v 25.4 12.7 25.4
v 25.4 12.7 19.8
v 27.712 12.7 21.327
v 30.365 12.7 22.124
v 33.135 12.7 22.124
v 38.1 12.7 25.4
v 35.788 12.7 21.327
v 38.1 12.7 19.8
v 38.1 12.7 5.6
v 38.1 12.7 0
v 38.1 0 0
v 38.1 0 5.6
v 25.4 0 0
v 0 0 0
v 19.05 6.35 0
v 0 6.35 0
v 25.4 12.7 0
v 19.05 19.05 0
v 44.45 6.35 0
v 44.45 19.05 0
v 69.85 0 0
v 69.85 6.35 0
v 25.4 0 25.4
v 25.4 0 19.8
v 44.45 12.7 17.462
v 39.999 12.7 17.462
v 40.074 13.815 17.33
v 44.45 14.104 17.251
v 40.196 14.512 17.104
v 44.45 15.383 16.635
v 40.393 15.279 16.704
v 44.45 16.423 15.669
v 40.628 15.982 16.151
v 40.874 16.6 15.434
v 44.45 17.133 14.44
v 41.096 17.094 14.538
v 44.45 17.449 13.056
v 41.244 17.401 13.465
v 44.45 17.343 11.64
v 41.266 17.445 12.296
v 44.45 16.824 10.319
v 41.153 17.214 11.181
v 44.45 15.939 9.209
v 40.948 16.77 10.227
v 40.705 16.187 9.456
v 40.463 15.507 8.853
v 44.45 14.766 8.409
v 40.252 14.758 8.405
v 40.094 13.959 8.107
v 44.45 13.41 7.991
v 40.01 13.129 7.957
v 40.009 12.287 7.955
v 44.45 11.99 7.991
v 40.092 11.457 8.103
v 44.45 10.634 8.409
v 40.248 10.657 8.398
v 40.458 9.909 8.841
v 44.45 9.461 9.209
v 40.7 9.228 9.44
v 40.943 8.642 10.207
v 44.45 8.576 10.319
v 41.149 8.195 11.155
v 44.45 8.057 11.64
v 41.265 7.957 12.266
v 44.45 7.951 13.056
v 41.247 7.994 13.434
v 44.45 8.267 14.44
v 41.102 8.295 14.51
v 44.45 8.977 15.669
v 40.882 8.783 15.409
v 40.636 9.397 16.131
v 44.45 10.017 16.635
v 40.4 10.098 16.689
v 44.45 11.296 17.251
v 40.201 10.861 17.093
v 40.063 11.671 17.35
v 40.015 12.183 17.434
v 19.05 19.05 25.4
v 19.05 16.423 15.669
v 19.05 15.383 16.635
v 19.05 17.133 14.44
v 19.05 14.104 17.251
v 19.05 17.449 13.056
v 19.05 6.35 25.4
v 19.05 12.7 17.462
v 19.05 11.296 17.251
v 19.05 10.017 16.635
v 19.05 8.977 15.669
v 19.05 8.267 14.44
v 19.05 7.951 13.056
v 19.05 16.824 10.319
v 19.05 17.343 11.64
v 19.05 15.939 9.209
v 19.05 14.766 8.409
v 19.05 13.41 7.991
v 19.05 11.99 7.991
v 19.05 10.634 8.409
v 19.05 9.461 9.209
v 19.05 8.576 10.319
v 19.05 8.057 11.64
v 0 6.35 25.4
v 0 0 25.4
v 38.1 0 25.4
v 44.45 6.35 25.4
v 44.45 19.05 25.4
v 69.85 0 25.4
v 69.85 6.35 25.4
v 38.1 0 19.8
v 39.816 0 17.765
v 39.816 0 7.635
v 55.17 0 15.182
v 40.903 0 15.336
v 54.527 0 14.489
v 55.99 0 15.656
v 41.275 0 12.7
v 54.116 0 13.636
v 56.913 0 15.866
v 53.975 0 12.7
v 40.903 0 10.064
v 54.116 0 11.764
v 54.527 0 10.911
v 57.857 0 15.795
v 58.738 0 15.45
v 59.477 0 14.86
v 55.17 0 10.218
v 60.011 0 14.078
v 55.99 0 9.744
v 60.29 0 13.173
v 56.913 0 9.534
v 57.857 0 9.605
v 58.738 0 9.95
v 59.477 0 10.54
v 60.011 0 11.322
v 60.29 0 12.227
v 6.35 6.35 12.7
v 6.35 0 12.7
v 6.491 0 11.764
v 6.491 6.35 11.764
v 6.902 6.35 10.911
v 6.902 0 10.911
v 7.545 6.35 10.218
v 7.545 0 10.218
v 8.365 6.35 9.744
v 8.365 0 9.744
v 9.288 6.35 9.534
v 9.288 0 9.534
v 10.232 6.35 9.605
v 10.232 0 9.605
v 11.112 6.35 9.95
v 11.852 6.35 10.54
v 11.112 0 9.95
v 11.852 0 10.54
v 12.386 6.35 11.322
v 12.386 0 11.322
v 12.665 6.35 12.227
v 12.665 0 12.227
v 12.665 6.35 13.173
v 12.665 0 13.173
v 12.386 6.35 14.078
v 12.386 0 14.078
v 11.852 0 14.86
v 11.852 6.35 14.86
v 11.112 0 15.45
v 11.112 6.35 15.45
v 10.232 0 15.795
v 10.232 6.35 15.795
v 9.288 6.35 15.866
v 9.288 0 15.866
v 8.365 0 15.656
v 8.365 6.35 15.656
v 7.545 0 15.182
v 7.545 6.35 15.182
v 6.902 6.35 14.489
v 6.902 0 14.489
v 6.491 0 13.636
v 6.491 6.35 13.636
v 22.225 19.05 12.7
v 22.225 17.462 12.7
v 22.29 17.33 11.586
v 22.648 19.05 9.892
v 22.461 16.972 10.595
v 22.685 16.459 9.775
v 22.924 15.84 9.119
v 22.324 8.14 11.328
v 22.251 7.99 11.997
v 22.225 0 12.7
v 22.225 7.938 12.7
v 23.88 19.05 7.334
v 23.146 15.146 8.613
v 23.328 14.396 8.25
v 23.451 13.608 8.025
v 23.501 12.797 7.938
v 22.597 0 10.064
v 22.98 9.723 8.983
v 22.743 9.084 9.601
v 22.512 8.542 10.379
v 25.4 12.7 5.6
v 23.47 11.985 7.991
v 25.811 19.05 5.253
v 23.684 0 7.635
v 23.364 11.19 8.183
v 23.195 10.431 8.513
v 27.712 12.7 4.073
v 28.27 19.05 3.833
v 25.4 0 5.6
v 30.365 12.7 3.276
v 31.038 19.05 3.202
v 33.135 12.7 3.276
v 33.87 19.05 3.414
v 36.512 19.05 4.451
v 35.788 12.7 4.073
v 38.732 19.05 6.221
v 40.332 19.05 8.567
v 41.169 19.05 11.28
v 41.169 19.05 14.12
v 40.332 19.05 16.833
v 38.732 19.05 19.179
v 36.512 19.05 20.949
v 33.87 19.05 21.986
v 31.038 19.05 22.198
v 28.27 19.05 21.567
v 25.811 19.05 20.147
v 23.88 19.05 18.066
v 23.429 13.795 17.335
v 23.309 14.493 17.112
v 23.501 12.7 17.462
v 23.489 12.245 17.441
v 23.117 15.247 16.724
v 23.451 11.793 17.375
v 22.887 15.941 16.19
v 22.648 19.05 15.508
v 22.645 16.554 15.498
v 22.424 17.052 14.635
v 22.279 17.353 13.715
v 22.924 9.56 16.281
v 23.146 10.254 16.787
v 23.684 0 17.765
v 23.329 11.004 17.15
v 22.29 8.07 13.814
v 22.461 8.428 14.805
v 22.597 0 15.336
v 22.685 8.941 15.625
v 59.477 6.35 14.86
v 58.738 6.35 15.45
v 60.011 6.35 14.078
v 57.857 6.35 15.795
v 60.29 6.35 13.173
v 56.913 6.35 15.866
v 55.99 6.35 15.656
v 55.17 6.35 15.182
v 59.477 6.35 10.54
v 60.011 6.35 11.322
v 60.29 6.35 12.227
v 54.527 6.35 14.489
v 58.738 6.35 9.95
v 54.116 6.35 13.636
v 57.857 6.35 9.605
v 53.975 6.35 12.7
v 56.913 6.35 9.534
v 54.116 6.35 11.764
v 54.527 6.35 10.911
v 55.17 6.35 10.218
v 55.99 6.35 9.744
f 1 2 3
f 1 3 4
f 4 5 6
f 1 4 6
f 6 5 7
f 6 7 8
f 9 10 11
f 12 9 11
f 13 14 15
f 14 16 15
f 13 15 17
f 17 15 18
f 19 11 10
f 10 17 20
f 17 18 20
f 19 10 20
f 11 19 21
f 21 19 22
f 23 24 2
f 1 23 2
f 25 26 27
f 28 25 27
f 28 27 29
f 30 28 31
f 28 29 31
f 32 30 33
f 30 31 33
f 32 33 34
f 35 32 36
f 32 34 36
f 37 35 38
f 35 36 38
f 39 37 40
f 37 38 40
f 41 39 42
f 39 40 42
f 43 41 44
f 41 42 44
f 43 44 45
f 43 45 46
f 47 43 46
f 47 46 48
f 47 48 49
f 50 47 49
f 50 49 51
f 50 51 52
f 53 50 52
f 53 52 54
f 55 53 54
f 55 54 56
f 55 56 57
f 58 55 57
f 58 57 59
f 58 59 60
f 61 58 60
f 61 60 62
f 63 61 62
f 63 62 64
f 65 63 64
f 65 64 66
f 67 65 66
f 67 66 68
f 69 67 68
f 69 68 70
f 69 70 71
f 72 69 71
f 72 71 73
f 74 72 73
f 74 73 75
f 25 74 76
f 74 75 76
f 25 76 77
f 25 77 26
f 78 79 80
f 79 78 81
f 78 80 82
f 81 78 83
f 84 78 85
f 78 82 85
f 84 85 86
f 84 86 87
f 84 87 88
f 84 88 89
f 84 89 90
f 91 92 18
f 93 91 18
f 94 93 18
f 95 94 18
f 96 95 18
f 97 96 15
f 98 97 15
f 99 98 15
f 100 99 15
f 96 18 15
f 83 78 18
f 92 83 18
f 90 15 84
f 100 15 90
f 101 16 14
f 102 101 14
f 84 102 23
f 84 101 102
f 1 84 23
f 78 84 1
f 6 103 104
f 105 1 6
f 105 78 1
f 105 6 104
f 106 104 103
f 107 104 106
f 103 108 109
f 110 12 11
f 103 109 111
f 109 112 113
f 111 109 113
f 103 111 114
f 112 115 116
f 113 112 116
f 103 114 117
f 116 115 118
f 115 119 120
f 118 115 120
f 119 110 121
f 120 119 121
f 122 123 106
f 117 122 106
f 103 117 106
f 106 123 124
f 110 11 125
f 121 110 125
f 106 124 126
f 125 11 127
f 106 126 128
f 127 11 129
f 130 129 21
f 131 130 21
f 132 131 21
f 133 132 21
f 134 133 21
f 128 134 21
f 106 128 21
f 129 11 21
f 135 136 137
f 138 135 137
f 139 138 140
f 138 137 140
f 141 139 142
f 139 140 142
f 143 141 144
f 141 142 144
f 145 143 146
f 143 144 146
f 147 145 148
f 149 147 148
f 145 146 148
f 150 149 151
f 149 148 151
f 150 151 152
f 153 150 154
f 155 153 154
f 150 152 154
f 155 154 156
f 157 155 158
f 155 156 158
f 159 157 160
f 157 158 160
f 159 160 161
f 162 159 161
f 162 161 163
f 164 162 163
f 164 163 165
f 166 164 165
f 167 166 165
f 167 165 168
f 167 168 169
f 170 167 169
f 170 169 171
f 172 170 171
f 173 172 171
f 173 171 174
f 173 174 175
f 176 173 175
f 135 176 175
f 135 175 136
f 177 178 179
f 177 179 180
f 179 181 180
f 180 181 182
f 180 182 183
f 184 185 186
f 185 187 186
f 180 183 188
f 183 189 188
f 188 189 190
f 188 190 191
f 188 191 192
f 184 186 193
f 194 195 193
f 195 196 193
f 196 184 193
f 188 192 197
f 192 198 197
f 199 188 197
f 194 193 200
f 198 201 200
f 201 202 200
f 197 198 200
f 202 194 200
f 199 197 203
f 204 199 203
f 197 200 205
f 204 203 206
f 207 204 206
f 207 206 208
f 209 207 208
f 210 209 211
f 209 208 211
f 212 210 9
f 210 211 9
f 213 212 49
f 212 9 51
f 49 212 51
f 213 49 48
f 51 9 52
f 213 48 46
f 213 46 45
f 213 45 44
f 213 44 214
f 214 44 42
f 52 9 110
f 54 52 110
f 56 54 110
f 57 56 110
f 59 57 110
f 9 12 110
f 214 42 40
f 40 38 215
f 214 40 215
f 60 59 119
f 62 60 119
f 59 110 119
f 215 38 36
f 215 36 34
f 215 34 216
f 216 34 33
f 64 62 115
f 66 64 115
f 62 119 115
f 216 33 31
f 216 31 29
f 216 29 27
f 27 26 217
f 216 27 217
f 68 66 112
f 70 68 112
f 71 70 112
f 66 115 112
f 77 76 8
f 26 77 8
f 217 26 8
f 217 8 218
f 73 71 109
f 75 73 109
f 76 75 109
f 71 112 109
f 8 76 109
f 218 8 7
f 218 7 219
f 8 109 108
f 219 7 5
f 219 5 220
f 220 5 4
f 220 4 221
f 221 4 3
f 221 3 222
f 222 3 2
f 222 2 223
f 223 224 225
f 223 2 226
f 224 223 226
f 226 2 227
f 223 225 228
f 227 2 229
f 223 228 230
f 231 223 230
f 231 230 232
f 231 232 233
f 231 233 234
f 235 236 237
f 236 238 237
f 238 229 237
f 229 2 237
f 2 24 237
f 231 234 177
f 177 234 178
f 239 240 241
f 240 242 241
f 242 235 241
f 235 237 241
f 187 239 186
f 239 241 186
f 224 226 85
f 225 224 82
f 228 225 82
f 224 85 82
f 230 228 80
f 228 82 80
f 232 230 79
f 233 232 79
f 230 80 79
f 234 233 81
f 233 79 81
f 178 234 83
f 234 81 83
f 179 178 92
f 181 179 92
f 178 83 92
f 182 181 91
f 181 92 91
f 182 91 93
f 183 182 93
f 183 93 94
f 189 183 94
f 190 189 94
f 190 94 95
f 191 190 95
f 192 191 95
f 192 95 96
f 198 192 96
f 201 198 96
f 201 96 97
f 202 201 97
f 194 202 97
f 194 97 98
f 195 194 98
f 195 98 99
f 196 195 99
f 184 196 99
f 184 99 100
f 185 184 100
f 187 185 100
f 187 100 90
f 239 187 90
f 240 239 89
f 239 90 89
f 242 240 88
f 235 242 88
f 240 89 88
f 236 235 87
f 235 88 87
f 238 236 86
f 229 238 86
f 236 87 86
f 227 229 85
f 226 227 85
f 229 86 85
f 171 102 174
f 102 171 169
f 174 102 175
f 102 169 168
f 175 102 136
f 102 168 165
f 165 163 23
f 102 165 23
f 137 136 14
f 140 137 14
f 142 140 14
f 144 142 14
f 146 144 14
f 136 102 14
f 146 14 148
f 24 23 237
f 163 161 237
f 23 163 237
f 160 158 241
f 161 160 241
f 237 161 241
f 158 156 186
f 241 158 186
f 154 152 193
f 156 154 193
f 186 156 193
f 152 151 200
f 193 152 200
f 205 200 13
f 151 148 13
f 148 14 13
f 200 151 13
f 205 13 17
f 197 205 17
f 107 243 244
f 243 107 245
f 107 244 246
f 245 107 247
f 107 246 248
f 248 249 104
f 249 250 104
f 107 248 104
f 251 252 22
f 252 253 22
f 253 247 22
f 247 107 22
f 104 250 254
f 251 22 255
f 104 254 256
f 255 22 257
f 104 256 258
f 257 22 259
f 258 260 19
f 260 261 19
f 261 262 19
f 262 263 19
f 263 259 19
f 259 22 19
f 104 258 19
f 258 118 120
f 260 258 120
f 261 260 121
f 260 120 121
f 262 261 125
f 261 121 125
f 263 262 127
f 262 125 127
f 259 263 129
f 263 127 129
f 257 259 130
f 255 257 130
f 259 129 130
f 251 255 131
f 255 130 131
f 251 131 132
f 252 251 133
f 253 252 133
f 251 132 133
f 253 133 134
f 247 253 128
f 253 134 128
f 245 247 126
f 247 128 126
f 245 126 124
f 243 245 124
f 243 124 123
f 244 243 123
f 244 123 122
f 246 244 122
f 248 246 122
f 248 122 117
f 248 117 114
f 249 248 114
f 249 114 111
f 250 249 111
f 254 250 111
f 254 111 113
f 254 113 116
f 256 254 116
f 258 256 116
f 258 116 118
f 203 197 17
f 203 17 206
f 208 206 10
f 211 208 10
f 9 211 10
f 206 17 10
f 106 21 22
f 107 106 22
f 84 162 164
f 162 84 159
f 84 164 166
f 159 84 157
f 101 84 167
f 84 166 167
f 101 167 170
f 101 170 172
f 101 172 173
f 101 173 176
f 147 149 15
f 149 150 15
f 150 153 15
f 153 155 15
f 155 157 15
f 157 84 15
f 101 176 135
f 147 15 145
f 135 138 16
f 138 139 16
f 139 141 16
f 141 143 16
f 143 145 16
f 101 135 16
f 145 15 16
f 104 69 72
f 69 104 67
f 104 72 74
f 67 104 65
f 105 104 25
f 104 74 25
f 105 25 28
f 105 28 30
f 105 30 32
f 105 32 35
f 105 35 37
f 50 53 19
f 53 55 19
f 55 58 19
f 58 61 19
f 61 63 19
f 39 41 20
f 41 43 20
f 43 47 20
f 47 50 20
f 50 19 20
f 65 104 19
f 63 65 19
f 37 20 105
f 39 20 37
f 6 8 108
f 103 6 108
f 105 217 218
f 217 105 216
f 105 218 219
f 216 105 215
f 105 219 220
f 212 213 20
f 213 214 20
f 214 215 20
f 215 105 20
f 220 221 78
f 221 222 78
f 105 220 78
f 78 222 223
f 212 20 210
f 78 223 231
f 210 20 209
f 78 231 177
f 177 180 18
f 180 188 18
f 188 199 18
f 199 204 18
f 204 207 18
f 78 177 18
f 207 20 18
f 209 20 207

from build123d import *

# Parameters (mm, degrees)
BOSS_EXTRUDE1_DEPTH          = 25.4
F_1_2_0_75_DIAMETER_HOLE2_D  = 19.05
F_1_2_0_25_DIAMETER_HOLE1_D  = 6.35
F_1_2_0_25_DIAMETER_HOLE2_D  = 6.35
F_1_2_0_375_DIAMETER_HOLE1_D = 9.525


with BuildPart() as part:
    # Sketch1 → Boss-Extrude1 (new body)
    with BuildSketch(Plane.XY):
        Polygon((0, 0), (25.4, 0), (25.4, 12.7), (38.1, 12.7), (38.1, 0), (69.85, 0), (69.85, 6.35), (44.45, 6.35), (44.45, 19.05), (19.05, 19.05), (19.05, 6.35), (0, 6.35), align=None)
    extrude(amount=BOSS_EXTRUDE1_DEPTH)

    # 1/2 (0.75) Diameter Hole2 (through all)
    with Locations(Plane(origin=(0, 19.05, 0), x_dir=(1, 0, 0), z_dir=(0, 1, 0))):
        with Locations((31.75, -12.7)):
            Hole(F_1_2_0_75_DIAMETER_HOLE2_D / 2)

    # 1/2 (0.25) Diameter Hole1 (through all)
    with Locations(Plane(origin=(0, 6.35, 0), x_dir=(1, 0, 0), z_dir=(0, 1, 0))):
        with Locations((9.525, -12.7)):
            Hole(F_1_2_0_25_DIAMETER_HOLE1_D / 2)

    # 1/2 (0.25) Diameter Hole2 (through all)
    with Locations(Plane(origin=(0, 6.35, 0), x_dir=(1, 0, 0), z_dir=(0, 1, 0))):
        with Locations((57.15, -12.7)):
            Hole(F_1_2_0_25_DIAMETER_HOLE2_D / 2)

    # 1/2 (0.375) Diameter Hole1 (through all)
    with Locations(Plane(origin=(44.45, 0, 0), x_dir=(0, 0, -1), z_dir=(1, 0, 0))):
        with Locations((-12.7, 12.7)):
            Hole(F_1_2_0_375_DIAMETER_HOLE1_D / 2)


solid = part.part
